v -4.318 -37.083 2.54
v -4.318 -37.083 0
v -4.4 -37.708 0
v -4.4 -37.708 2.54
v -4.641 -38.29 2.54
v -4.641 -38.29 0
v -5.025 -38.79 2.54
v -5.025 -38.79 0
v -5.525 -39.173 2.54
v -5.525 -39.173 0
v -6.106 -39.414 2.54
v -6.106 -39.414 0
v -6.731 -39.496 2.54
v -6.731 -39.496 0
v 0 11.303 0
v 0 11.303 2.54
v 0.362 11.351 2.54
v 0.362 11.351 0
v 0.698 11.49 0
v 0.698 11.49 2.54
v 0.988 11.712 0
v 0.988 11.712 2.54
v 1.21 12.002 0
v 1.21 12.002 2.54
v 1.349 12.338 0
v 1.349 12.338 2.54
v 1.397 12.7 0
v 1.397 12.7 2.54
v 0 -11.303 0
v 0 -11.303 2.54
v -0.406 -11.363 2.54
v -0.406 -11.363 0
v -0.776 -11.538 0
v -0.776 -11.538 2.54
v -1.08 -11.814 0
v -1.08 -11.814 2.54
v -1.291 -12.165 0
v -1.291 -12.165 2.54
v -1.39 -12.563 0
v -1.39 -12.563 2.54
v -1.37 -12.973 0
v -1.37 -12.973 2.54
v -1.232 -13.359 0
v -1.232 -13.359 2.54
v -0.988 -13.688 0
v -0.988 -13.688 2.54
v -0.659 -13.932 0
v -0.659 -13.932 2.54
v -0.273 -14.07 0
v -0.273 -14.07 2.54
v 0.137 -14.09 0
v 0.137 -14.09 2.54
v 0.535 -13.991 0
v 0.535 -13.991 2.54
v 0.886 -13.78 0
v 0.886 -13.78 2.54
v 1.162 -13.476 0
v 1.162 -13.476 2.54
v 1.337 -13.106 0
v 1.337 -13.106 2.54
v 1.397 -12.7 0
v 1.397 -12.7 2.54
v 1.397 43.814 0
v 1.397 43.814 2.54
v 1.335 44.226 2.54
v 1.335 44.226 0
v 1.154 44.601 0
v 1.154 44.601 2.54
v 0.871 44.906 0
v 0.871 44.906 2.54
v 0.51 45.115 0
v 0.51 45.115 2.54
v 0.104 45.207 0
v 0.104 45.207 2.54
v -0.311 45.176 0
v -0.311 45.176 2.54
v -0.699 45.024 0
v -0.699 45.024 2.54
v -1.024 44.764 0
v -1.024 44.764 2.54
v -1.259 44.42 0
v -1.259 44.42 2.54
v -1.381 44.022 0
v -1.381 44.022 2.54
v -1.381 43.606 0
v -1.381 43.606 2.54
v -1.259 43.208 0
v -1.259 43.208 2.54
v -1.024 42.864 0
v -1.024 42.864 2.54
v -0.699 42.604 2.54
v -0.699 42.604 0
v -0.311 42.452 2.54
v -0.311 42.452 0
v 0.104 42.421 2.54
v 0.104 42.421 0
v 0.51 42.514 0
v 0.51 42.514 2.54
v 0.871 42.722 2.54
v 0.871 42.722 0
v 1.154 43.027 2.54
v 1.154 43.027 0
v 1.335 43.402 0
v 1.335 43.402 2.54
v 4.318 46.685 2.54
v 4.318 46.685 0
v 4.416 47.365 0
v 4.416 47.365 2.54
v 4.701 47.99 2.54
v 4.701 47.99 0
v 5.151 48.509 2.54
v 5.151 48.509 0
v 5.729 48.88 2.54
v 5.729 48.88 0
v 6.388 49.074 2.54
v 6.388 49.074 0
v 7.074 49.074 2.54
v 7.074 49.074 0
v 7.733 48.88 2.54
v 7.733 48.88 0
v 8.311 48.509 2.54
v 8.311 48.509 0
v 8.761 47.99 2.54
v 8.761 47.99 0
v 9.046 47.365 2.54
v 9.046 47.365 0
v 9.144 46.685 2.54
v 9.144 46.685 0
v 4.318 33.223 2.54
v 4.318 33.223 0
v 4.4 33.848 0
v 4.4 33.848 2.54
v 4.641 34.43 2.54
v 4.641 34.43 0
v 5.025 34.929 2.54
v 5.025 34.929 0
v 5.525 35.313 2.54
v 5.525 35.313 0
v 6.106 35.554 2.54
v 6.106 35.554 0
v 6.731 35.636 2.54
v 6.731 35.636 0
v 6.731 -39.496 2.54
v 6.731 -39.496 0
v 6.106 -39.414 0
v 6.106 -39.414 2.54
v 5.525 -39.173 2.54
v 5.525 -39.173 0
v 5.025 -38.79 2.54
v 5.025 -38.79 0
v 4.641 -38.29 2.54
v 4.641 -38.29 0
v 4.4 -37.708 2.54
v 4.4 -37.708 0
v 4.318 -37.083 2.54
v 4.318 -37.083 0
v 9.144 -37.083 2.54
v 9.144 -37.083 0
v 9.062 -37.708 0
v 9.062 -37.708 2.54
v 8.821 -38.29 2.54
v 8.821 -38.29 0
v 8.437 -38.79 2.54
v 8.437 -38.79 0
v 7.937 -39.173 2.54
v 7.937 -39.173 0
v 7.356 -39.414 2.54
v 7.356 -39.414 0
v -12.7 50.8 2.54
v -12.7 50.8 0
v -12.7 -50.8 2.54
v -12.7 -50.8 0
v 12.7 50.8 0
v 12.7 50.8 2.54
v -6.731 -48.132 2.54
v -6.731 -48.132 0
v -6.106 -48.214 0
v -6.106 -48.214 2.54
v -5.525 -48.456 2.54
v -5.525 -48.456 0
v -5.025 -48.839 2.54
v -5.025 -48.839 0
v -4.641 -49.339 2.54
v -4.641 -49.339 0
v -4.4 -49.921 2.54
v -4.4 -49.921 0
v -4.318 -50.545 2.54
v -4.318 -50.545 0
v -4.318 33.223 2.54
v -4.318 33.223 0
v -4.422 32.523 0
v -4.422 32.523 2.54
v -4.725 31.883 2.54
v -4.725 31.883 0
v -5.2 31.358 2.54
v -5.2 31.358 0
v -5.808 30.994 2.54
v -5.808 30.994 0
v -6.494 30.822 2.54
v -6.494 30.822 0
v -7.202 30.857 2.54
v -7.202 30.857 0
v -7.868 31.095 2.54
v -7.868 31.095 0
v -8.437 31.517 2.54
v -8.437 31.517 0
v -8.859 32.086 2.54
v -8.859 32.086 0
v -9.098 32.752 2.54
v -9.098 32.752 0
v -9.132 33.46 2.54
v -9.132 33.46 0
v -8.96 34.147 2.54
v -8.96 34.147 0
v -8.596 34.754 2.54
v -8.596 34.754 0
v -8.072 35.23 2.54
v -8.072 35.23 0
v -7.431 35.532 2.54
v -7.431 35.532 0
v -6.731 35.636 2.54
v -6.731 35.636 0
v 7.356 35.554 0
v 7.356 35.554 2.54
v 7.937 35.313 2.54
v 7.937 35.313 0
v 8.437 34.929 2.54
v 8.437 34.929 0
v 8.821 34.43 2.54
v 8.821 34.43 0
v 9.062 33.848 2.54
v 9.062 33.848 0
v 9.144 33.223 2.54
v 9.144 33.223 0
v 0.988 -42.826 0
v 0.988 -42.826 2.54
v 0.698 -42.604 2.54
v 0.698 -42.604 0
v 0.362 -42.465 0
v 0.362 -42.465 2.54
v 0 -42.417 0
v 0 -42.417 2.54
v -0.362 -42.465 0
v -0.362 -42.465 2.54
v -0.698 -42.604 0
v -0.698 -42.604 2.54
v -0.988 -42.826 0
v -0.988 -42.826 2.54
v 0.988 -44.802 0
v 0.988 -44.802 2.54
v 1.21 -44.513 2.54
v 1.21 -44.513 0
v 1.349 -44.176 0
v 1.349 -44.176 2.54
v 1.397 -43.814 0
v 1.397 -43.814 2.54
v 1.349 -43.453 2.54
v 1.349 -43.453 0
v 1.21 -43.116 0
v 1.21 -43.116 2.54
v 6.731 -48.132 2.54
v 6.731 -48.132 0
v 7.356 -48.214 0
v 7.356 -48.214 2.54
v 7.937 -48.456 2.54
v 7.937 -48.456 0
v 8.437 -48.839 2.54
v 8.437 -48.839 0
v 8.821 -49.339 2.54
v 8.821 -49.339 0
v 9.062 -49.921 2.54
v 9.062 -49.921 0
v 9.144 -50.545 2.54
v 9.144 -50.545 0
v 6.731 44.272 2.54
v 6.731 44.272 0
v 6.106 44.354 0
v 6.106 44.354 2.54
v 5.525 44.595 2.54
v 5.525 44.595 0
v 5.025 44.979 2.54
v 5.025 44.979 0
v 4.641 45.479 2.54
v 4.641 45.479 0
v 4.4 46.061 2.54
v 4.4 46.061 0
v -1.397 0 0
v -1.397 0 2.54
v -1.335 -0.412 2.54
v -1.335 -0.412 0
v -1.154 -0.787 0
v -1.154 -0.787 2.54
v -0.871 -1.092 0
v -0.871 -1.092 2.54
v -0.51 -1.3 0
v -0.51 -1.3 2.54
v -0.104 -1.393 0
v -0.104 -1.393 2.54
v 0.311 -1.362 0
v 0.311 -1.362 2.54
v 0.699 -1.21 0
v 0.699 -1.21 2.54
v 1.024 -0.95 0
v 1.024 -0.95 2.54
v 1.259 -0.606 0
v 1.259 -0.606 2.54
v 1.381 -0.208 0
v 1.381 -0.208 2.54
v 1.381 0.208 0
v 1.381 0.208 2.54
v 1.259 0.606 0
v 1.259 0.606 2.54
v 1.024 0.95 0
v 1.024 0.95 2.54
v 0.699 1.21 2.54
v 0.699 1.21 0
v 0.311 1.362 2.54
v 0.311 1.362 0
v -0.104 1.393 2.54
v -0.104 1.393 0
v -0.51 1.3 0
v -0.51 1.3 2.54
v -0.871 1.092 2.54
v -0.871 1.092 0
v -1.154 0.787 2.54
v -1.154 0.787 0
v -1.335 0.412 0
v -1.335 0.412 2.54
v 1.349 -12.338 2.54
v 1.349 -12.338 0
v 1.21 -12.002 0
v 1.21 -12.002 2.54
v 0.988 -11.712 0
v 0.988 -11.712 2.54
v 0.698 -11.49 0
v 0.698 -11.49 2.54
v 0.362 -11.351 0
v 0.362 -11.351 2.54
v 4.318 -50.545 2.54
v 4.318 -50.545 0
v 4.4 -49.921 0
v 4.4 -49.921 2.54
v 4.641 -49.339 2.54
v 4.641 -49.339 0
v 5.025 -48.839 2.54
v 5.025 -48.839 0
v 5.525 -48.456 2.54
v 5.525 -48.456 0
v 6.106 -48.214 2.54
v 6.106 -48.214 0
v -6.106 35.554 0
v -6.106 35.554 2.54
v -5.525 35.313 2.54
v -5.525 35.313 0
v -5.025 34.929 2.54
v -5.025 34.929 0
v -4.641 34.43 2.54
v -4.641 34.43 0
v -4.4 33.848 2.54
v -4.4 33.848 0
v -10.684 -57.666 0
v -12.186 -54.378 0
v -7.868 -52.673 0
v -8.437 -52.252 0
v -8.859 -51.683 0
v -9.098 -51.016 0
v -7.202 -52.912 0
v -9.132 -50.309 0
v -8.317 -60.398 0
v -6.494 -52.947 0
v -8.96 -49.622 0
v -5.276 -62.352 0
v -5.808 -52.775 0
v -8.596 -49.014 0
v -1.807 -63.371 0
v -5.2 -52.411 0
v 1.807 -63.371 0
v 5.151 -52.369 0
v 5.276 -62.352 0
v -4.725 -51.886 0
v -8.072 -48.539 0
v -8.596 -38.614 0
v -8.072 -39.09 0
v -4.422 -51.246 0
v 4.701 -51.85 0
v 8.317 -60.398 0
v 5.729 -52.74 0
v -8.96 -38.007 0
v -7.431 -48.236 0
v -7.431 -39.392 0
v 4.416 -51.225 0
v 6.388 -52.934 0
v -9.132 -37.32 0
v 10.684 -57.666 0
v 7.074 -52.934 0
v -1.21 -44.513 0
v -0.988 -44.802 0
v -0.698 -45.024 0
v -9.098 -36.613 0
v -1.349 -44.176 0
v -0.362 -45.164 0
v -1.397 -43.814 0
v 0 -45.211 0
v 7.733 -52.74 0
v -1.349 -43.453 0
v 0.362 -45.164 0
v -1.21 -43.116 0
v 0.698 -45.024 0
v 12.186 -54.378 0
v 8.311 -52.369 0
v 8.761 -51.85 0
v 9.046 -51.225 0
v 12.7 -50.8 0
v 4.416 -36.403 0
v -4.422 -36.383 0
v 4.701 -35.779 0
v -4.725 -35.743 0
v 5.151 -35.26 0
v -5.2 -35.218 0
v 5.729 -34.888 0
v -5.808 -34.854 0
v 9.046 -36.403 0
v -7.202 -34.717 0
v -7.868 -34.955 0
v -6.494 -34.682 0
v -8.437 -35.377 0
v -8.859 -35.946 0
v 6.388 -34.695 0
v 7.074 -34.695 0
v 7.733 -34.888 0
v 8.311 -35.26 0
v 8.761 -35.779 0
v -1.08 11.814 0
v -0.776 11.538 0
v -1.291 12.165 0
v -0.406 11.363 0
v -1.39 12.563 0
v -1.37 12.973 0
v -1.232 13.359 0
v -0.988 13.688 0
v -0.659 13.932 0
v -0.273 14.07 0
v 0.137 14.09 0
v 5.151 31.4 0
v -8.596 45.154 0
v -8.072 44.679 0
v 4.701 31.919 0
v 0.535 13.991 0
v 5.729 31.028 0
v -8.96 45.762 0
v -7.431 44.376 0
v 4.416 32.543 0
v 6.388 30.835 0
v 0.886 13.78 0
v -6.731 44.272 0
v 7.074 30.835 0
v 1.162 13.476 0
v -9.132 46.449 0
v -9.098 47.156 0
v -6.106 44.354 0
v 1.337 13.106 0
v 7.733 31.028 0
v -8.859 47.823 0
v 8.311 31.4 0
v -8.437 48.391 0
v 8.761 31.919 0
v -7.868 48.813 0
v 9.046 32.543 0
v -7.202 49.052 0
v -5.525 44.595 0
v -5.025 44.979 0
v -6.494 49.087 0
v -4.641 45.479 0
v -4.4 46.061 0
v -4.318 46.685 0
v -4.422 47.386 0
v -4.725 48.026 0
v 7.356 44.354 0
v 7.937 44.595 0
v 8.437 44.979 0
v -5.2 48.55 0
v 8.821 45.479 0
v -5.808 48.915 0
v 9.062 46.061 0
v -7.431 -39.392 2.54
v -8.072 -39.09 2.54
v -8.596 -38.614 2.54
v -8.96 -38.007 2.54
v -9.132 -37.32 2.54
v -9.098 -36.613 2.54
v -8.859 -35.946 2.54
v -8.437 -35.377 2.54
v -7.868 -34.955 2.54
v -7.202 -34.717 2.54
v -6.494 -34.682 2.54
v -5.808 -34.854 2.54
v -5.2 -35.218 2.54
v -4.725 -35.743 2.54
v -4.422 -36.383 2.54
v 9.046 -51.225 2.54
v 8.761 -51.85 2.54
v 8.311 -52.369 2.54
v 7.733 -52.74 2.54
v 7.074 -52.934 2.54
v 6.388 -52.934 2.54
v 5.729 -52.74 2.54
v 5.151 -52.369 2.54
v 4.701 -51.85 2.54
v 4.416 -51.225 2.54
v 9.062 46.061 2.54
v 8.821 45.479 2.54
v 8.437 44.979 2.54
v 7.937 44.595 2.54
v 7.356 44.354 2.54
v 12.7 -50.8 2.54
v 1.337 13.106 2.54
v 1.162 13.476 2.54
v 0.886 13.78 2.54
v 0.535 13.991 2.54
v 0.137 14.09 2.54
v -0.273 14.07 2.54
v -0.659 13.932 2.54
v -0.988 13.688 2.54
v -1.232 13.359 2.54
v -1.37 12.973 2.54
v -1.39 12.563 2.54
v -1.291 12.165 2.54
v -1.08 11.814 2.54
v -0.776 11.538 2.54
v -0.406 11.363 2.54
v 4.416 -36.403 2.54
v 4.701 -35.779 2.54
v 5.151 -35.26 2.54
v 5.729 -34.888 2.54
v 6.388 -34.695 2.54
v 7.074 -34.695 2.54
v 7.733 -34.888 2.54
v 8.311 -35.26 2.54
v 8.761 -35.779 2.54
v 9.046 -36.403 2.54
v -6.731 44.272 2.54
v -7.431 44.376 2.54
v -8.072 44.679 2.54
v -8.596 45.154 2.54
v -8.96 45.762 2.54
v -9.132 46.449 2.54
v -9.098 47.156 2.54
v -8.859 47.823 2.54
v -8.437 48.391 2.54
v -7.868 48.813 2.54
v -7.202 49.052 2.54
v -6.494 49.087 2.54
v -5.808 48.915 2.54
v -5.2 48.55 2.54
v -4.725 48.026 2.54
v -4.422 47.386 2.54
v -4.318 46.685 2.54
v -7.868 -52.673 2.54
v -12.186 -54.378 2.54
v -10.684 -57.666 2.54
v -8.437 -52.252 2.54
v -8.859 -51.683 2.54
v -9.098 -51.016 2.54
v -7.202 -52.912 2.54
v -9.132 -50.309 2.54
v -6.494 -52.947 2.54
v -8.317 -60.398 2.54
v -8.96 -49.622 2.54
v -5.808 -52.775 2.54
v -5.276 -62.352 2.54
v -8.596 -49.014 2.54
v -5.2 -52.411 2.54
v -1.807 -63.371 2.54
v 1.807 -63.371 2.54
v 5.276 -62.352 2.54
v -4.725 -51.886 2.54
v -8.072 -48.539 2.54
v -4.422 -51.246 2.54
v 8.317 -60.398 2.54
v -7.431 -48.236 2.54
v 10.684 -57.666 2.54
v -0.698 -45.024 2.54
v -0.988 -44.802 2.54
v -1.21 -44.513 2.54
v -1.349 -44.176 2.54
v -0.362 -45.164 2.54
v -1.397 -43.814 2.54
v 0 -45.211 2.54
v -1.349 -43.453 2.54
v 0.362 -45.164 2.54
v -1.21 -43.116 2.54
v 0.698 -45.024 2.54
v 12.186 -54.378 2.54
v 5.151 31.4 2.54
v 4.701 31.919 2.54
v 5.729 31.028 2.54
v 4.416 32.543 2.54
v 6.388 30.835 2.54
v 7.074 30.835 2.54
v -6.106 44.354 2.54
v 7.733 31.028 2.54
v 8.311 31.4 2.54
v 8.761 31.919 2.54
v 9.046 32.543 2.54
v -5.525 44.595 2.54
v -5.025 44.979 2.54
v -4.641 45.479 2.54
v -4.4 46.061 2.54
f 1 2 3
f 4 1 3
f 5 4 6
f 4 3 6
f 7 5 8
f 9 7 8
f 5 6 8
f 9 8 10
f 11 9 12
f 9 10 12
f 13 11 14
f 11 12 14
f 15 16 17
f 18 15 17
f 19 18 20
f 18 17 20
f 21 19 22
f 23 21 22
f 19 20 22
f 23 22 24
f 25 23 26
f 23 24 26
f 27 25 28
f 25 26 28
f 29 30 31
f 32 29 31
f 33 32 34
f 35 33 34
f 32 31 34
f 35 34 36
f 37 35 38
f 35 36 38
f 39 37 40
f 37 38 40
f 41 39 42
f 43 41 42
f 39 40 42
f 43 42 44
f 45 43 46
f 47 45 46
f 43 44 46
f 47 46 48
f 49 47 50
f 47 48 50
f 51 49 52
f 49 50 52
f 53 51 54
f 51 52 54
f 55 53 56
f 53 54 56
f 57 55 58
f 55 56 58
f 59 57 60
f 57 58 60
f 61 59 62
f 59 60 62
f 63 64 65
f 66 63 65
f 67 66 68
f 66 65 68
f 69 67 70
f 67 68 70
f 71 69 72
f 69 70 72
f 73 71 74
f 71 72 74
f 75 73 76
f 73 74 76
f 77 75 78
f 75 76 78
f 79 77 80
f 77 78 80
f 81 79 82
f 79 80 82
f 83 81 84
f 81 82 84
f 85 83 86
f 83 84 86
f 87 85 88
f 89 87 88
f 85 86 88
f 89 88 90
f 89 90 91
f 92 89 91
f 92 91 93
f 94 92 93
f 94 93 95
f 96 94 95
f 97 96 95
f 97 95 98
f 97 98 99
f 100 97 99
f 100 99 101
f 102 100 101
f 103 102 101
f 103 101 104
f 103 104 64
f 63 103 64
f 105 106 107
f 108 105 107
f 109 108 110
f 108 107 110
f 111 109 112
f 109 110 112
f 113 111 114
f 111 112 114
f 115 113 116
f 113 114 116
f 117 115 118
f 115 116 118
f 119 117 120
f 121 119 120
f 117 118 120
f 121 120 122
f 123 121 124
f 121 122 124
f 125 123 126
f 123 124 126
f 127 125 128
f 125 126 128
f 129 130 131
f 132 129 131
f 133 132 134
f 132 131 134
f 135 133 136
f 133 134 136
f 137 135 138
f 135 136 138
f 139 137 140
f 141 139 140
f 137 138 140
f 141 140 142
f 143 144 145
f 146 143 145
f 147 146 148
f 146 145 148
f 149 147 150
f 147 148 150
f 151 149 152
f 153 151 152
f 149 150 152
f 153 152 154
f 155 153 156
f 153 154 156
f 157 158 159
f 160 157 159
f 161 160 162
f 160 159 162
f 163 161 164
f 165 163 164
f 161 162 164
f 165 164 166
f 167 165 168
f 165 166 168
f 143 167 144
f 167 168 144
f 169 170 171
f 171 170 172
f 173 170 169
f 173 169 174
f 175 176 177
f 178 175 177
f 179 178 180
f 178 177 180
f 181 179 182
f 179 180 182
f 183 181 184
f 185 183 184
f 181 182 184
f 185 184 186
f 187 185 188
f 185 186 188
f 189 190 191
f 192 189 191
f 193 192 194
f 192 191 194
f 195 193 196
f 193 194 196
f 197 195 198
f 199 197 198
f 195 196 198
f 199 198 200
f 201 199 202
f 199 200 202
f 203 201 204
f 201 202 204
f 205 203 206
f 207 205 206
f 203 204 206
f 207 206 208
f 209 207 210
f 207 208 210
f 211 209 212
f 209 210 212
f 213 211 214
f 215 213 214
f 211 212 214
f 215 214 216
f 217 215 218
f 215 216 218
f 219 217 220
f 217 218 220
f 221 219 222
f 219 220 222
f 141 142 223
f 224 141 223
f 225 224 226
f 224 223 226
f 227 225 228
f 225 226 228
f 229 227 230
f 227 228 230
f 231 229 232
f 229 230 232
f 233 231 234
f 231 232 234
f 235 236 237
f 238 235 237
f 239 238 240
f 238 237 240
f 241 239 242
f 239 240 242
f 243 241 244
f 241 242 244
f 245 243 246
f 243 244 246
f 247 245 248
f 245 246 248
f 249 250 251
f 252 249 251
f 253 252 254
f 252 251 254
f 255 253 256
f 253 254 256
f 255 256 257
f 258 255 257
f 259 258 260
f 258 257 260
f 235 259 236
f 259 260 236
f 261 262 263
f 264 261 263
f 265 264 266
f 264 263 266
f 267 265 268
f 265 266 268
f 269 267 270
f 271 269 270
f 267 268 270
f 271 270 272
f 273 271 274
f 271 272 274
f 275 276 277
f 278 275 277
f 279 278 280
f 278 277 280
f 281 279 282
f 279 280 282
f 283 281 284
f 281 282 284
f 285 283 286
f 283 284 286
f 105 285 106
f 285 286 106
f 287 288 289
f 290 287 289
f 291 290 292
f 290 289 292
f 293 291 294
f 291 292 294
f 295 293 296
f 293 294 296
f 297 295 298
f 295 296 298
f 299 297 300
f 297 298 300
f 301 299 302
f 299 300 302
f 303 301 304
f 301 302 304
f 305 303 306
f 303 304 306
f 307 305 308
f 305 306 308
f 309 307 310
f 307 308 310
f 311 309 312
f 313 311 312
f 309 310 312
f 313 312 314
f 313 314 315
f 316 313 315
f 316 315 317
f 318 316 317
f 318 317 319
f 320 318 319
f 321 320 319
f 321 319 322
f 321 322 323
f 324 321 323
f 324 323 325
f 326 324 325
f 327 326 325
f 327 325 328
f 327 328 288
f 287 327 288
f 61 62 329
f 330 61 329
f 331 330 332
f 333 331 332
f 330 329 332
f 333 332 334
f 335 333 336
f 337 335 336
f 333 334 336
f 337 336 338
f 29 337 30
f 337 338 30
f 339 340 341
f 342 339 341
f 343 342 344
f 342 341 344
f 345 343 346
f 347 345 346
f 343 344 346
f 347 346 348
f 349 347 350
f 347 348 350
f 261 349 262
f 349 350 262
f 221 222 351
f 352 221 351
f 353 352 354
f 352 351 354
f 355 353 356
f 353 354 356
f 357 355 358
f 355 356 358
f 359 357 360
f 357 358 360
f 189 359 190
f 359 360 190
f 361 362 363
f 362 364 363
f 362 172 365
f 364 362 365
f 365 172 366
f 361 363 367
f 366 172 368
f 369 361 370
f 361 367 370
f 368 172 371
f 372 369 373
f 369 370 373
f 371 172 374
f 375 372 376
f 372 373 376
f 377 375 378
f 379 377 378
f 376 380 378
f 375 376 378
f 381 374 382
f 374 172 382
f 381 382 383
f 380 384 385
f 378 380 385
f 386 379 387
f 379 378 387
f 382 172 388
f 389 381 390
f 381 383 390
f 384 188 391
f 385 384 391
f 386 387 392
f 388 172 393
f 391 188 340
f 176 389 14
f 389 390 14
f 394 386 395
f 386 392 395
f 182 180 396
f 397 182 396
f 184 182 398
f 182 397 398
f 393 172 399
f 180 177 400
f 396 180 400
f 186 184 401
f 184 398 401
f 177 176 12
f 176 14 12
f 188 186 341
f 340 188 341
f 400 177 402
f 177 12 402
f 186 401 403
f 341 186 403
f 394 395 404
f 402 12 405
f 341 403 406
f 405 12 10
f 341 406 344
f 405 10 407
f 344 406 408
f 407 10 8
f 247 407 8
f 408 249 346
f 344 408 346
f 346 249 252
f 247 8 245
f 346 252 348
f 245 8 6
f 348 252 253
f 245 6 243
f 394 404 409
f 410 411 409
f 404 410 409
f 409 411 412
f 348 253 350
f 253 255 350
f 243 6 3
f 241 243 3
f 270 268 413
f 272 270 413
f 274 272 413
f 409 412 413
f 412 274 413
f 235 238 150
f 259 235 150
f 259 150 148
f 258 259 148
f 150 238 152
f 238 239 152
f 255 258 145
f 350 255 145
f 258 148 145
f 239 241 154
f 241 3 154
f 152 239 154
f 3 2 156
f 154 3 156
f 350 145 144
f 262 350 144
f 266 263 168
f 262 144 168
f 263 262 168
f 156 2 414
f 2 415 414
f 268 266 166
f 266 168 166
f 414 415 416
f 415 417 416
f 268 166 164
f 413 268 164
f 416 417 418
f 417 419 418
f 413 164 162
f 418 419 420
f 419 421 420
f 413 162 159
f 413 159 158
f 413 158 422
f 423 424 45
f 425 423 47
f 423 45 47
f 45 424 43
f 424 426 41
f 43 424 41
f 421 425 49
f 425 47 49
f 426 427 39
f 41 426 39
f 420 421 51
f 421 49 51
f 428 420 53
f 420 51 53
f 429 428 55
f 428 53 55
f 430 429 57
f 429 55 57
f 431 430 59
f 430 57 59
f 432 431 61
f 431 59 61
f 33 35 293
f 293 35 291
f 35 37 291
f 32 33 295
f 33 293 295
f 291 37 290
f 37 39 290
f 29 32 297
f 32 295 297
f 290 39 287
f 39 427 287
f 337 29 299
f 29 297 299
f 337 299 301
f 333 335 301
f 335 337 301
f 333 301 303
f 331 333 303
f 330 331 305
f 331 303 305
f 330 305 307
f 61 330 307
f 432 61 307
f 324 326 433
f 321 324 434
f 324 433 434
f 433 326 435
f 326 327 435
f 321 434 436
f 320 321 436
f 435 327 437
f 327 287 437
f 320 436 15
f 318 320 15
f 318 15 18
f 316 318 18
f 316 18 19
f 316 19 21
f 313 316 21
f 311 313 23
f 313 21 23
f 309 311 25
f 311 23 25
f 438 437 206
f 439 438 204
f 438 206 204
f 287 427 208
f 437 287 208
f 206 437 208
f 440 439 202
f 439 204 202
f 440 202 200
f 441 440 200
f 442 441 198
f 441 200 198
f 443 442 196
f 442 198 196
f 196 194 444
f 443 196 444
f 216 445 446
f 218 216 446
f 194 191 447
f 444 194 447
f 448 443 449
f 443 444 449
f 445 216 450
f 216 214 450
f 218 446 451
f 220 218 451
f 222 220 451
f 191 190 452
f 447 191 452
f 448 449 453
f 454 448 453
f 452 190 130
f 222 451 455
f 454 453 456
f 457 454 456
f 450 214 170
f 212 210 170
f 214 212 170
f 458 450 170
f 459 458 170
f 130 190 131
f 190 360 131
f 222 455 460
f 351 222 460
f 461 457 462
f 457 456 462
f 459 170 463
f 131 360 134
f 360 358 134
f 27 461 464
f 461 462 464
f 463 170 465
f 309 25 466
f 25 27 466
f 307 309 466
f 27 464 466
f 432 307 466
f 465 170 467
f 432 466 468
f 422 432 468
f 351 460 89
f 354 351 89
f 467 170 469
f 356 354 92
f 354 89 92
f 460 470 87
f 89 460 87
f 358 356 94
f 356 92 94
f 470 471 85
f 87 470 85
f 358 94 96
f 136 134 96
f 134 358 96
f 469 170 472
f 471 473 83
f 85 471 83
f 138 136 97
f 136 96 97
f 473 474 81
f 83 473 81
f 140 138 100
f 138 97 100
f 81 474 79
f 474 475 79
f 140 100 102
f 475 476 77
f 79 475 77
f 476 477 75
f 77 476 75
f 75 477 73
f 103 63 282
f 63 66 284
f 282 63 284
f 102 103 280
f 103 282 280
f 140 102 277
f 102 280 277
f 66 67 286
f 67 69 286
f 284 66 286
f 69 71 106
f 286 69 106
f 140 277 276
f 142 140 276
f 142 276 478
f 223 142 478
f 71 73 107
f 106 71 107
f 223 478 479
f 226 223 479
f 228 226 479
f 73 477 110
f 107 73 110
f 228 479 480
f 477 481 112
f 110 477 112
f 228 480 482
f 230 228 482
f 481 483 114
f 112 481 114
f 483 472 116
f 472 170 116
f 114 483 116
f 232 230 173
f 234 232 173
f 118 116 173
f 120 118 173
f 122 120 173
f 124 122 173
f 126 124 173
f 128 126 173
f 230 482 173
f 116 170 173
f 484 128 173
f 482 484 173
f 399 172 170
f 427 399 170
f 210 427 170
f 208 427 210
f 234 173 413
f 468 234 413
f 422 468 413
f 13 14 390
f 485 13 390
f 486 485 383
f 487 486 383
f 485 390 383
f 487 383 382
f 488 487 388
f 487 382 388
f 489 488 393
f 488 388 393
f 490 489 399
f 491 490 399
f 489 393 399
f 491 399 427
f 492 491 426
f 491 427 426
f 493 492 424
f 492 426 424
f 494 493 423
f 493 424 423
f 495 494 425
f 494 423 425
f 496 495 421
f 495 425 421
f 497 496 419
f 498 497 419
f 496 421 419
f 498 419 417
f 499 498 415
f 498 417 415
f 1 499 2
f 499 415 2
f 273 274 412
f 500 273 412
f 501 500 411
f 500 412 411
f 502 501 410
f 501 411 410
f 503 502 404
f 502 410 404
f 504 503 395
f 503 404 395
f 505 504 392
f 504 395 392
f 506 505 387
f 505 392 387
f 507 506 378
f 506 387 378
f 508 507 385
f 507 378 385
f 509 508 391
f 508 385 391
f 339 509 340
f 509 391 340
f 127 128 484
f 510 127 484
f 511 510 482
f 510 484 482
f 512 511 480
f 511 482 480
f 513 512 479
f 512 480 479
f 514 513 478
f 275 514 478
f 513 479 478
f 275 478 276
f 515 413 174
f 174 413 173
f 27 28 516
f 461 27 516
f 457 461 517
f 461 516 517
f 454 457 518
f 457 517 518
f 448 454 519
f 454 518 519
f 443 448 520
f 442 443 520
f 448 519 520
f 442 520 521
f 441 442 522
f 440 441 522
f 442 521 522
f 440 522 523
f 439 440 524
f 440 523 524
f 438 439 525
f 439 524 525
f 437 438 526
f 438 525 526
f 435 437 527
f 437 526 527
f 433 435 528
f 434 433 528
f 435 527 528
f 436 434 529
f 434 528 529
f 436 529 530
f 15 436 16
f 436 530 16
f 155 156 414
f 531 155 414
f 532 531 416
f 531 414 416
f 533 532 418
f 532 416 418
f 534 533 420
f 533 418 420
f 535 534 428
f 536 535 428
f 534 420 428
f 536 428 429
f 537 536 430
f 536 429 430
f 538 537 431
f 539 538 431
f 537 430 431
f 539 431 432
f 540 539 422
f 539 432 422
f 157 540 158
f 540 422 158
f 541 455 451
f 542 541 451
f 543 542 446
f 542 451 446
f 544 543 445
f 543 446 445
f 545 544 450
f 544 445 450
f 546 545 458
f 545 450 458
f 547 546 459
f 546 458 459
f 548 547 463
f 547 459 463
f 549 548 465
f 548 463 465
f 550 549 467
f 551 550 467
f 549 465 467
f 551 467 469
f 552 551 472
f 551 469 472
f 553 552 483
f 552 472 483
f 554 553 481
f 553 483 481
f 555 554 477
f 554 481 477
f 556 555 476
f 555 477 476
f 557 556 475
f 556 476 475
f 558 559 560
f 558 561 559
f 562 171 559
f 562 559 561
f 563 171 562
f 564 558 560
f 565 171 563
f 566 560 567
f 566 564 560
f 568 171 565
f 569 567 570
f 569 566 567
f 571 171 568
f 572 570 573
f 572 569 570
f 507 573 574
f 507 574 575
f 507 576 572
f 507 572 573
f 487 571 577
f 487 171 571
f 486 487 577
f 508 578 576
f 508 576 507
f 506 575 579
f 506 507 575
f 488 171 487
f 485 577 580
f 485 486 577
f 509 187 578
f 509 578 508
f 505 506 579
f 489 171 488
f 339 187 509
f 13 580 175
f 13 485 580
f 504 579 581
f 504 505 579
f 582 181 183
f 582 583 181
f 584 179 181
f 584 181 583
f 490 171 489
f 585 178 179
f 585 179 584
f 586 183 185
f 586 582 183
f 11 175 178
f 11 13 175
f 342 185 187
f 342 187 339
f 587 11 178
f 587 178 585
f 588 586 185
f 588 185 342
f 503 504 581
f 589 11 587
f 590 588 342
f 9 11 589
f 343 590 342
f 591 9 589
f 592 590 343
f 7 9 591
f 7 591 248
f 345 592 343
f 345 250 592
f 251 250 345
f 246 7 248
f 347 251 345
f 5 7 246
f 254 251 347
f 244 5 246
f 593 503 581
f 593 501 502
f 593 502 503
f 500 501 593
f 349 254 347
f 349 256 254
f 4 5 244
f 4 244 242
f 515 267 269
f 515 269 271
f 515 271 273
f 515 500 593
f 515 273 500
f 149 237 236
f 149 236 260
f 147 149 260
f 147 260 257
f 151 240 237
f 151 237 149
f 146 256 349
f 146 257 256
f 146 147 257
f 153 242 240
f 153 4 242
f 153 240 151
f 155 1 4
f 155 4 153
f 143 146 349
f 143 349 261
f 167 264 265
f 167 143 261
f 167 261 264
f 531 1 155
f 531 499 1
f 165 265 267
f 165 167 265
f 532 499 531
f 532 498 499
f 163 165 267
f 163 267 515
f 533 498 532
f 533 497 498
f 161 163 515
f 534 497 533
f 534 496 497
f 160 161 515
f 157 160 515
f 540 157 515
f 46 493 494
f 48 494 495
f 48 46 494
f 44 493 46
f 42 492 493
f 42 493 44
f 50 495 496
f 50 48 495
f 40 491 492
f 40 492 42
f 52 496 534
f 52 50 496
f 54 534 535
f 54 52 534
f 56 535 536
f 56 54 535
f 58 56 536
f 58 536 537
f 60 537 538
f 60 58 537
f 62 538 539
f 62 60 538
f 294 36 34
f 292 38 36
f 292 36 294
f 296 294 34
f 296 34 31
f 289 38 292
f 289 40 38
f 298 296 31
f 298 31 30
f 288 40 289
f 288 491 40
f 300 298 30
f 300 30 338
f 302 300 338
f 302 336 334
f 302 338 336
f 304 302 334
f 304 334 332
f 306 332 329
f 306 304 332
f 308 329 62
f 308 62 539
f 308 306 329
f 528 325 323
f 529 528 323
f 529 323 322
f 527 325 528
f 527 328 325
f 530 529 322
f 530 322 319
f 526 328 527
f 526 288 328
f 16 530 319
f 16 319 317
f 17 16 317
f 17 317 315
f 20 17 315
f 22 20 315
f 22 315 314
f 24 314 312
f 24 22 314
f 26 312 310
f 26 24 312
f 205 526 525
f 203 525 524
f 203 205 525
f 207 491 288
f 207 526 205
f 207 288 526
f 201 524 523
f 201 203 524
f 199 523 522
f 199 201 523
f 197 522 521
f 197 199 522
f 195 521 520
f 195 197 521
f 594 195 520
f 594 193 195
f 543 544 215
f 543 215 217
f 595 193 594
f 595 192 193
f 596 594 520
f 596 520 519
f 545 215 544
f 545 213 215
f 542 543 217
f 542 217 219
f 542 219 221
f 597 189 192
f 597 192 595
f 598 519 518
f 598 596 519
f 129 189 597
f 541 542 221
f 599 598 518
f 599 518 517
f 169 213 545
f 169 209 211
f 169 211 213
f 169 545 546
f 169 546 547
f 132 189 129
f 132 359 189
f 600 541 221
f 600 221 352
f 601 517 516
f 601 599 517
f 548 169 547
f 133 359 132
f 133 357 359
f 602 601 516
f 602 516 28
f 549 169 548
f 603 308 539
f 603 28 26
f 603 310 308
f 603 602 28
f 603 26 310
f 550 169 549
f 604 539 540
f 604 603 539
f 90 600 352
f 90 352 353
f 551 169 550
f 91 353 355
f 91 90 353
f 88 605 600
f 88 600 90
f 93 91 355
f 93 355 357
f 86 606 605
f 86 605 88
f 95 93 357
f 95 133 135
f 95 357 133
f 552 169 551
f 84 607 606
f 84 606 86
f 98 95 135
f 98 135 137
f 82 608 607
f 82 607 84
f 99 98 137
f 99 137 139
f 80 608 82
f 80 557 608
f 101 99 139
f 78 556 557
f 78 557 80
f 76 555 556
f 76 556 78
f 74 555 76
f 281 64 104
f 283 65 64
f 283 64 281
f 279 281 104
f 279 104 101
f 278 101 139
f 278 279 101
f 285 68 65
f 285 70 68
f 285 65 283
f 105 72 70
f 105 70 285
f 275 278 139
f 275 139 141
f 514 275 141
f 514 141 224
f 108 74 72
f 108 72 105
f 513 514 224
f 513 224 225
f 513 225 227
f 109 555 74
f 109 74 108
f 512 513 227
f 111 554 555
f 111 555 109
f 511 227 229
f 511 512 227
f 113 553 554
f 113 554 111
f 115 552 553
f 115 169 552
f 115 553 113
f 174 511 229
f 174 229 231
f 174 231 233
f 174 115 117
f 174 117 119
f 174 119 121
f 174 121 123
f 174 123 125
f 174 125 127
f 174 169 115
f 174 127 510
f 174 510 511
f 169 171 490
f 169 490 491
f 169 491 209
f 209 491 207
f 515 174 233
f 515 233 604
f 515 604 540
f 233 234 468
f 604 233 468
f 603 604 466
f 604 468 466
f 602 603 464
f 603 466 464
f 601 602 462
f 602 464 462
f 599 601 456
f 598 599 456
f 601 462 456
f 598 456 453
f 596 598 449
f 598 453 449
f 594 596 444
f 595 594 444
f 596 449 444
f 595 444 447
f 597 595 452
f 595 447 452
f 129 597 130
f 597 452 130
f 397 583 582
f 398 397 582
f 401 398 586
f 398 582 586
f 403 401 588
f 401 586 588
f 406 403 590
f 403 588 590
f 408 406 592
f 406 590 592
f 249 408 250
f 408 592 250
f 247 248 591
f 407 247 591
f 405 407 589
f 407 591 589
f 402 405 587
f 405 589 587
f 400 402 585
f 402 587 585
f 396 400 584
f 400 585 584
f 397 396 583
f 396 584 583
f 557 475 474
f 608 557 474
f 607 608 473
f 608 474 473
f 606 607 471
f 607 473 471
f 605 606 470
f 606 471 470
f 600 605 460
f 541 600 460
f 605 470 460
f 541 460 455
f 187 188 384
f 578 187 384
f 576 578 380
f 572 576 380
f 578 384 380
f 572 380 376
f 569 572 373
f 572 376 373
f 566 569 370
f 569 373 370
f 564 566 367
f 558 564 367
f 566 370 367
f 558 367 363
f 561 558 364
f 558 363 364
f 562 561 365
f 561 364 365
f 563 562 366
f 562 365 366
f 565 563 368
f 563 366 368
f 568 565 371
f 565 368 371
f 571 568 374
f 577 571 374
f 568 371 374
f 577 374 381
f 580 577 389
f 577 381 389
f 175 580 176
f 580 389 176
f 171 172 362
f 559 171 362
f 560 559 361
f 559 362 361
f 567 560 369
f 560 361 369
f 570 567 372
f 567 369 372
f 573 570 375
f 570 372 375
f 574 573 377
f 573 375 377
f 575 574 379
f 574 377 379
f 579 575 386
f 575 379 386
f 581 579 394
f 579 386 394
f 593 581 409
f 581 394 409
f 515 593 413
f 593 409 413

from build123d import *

# Parameters (mm, degrees)
F0_W     = 25.4
F0_H     = 52.7300323124
F1_DEPTH = 2.54
F2_R     = 1.397
F3_DEPTH = 2.541
F5_DEPTH = 25.4


with BuildPart() as f1:
    # F0 (on Top) → F1 (new body)
    with BuildSketch(Plane.XY):
        with Locations((0, 24.4349838438)):
            Rectangle(F0_W, F0_H)
        with BuildLine():
            Line((4.318, 33.2232), (-4.318, 33.2232))
            ThreePointArc((-4.318, 33.2232), (-8.437248663, 31.516951337), (-6.731, 35.6362))
            Line((-6.731, 35.6362), (-6.731, 44.2722))
            ThreePointArc((-6.731, 44.2722), (-8.437248663, 48.391448663), (-4.318, 46.6852))
            Line((-4.318, 46.6852), (4.318, 46.6852))
            ThreePointArc((4.318, 46.6852), (6.731, 49.0982), (9.144, 46.6852))
            ThreePointArc((9.144, 46.6852), (8.437248663, 44.978951337), (6.731, 44.2722))
            Line((6.731, 44.2722), (6.731, 35.6362))
            ThreePointArc((6.731, 35.6362), (8.437248663, 34.929448663), (9.144, 33.2232))
            ThreePointArc((9.144, 33.2232), (6.731, 30.8102), (4.318, 33.2232))
        make_face(mode=Mode.SUBTRACT)
        with BuildLine():
            Line((12.7, -50.8), (12.7, -1.9300323124))
            Line((12.7, -1.9300323124), (-12.7, -1.9300323124))
            Line((-12.7, -1.9300323124), (-12.7, -50.8))
            ThreePointArc((-12.7, -50.8), (0, -63.5), (12.7, -50.8))
        make_face()
        with BuildLine():
            Line((4.318, -50.5452646249), (-4.318, -50.5452646249))
            ThreePointArc((-4.318, -50.5452646249), (-8.437248663, -52.2515132879), (-6.731, -48.1322646249))
            Line((-6.731, -48.1322646249), (-6.731, -39.4962646249))
            ThreePointArc((-6.731, -39.4962646249), (-8.437248663, -35.3770159619), (-4.318, -37.0832646249))
            Line((-4.318, -37.0832646249), (4.318, -37.0832646249))
            ThreePointArc((4.318, -37.0832646249), (6.731, -34.6702646249), (9.144, -37.0832646249))
            ThreePointArc((9.144, -37.0832646249), (8.437248663, -38.7895132879), (6.731, -39.4962646249))
            Line((6.731, -39.4962646249), (6.731, -48.1322646249))
            ThreePointArc((6.731, -48.1322646249), (8.437248663, -48.8390159619), (9.144, -50.5452646249))
            ThreePointArc((9.144, -50.5452646249), (6.731, -52.9582646249), (4.318, -50.5452646249))
        make_face(mode=Mode.SUBTRACT)
        with BuildLine():
            ThreePointArc((-6.731, -48.1322646249), (-5.024751337, -48.8390159619), (-4.318, -50.5452646249))
            Line((-4.318, -50.5452646249), (4.318, -50.5452646249))
            ThreePointArc((4.318, -50.5452646249), (5.024751337, -48.8390159619), (6.731, -48.1322646249))
            Line((6.731, -48.1322646249), (6.731, -39.4962646249))
            ThreePointArc((6.731, -39.4962646249), (5.024751337, -38.7895132879), (4.318, -37.0832646249))
            Line((4.318, -37.0832646249), (-4.318, -37.0832646249))
            ThreePointArc((-4.318, -37.0832646249), (-5.024751337, -38.7895132879), (-6.731, -39.4962646249))
            Line((-6.731, -39.4962646249), (-6.731, -48.1322646249))
        make_face()
        with BuildLine():
            ThreePointArc((-6.731, 35.6362), (-5.024751337, 34.929448663), (-4.318, 33.2232))
            Line((-4.318, 33.2232), (4.318, 33.2232))
            ThreePointArc((4.318, 33.2232), (5.024751337, 34.929448663), (6.731, 35.6362))
            Line((6.731, 35.6362), (6.731, 44.2722))
            ThreePointArc((6.731, 44.2722), (5.024751337, 44.978951337), (4.318, 46.6852))
            Line((4.318, 46.6852), (-4.318, 46.6852))
            ThreePointArc((-4.318, 46.6852), (-5.024751337, 44.978951337), (-6.731, 44.2722))
            Line((-6.731, 44.2722), (-6.731, 35.6362))
        make_face()
    extrude(amount=F1_DEPTH)

    # F2 (on face) → F3 (cut, through all)
    with BuildSketch(Plane.XY.offset(2.54)):
        with BuildLine():
            Line((-1.397, 0), (1.397, 0))
            ThreePointArc((1.397, 0), (0, 1.397), (-1.397, 0))
        make_face()
        with BuildLine():
            ThreePointArc((-1.397, 0), (0, -1.397), (1.397, 0))
            Line((1.397, 0), (-1.397, 0))
        make_face()
        with BuildLine():
            ThreePointArc((0.9878281733, -42.8264364516), (0, -42.4172646249), (-0.9878281733, -42.8264364516))
            Line((-0.9878281733, -42.8264364516), (0, -43.8142646249))
            Line((0, -43.8142646249), (0.9878281733, -42.8264364516))
        make_face()
        with BuildLine():
            Line((0, -43.8142646249), (-0.9878281733, -42.8264364516))
            ThreePointArc((-0.9878281733, -42.8264364516), (-1.397, -43.8142646249), (-0.9878281733, -44.8020927982))
            Line((-0.9878281733, -44.8020927982), (0, -43.8142646249))
        make_face()
        with BuildLine():
            Line((0.9878281733, -42.8264364516), (0, -43.8142646249))
            Line((0, -43.8142646249), (0.9878281733, -44.8020927982))
            ThreePointArc((0.9878281733, -44.8020927982), (1.2906597069, -44.3488733799), (1.397, -43.8142646249))
            ThreePointArc((1.397, -43.8142646249), (1.2906597069, -43.2796558699), (0.9878281733, -42.8264364516))
        make_face()
        with BuildLine():
            Line((0.9878281733, -44.8020927982), (0, -43.8142646249))
            Line((0, -43.8142646249), (-0.9878281733, -44.8020927982))
            ThreePointArc((-0.9878281733, -44.8020927982), (0, -45.2112646249), (0.9878281733, -44.8020927982))
        make_face()
        with Locations((0, 43.8142646249)):
            Circle(F2_R)
    extrude(amount=-F3_DEPTH, mode=Mode.SUBTRACT)

    # F4 (on face) → F5 (cut)
    with BuildSketch(Plane.XY.offset(2.54)):
        with BuildLine():
            ThreePointArc((1.397, 12.7), (-0.9878281733, 13.6878281733), (0, 11.303))
            ThreePointArc((0, 11.303), (0.9878281733, 11.7121718267), (1.397, 12.7))
        make_face()
        with BuildLine():
            ThreePointArc((1.397, -12.7), (0.9878281733, -11.7121718267), (0, -11.303))
            ThreePointArc((0, -11.303), (-0.9878281733, -13.6878281733), (1.397, -12.7))
        make_face()
    extrude(amount=-F5_DEPTH, mode=Mode.SUBTRACT)


solid = f1.part
